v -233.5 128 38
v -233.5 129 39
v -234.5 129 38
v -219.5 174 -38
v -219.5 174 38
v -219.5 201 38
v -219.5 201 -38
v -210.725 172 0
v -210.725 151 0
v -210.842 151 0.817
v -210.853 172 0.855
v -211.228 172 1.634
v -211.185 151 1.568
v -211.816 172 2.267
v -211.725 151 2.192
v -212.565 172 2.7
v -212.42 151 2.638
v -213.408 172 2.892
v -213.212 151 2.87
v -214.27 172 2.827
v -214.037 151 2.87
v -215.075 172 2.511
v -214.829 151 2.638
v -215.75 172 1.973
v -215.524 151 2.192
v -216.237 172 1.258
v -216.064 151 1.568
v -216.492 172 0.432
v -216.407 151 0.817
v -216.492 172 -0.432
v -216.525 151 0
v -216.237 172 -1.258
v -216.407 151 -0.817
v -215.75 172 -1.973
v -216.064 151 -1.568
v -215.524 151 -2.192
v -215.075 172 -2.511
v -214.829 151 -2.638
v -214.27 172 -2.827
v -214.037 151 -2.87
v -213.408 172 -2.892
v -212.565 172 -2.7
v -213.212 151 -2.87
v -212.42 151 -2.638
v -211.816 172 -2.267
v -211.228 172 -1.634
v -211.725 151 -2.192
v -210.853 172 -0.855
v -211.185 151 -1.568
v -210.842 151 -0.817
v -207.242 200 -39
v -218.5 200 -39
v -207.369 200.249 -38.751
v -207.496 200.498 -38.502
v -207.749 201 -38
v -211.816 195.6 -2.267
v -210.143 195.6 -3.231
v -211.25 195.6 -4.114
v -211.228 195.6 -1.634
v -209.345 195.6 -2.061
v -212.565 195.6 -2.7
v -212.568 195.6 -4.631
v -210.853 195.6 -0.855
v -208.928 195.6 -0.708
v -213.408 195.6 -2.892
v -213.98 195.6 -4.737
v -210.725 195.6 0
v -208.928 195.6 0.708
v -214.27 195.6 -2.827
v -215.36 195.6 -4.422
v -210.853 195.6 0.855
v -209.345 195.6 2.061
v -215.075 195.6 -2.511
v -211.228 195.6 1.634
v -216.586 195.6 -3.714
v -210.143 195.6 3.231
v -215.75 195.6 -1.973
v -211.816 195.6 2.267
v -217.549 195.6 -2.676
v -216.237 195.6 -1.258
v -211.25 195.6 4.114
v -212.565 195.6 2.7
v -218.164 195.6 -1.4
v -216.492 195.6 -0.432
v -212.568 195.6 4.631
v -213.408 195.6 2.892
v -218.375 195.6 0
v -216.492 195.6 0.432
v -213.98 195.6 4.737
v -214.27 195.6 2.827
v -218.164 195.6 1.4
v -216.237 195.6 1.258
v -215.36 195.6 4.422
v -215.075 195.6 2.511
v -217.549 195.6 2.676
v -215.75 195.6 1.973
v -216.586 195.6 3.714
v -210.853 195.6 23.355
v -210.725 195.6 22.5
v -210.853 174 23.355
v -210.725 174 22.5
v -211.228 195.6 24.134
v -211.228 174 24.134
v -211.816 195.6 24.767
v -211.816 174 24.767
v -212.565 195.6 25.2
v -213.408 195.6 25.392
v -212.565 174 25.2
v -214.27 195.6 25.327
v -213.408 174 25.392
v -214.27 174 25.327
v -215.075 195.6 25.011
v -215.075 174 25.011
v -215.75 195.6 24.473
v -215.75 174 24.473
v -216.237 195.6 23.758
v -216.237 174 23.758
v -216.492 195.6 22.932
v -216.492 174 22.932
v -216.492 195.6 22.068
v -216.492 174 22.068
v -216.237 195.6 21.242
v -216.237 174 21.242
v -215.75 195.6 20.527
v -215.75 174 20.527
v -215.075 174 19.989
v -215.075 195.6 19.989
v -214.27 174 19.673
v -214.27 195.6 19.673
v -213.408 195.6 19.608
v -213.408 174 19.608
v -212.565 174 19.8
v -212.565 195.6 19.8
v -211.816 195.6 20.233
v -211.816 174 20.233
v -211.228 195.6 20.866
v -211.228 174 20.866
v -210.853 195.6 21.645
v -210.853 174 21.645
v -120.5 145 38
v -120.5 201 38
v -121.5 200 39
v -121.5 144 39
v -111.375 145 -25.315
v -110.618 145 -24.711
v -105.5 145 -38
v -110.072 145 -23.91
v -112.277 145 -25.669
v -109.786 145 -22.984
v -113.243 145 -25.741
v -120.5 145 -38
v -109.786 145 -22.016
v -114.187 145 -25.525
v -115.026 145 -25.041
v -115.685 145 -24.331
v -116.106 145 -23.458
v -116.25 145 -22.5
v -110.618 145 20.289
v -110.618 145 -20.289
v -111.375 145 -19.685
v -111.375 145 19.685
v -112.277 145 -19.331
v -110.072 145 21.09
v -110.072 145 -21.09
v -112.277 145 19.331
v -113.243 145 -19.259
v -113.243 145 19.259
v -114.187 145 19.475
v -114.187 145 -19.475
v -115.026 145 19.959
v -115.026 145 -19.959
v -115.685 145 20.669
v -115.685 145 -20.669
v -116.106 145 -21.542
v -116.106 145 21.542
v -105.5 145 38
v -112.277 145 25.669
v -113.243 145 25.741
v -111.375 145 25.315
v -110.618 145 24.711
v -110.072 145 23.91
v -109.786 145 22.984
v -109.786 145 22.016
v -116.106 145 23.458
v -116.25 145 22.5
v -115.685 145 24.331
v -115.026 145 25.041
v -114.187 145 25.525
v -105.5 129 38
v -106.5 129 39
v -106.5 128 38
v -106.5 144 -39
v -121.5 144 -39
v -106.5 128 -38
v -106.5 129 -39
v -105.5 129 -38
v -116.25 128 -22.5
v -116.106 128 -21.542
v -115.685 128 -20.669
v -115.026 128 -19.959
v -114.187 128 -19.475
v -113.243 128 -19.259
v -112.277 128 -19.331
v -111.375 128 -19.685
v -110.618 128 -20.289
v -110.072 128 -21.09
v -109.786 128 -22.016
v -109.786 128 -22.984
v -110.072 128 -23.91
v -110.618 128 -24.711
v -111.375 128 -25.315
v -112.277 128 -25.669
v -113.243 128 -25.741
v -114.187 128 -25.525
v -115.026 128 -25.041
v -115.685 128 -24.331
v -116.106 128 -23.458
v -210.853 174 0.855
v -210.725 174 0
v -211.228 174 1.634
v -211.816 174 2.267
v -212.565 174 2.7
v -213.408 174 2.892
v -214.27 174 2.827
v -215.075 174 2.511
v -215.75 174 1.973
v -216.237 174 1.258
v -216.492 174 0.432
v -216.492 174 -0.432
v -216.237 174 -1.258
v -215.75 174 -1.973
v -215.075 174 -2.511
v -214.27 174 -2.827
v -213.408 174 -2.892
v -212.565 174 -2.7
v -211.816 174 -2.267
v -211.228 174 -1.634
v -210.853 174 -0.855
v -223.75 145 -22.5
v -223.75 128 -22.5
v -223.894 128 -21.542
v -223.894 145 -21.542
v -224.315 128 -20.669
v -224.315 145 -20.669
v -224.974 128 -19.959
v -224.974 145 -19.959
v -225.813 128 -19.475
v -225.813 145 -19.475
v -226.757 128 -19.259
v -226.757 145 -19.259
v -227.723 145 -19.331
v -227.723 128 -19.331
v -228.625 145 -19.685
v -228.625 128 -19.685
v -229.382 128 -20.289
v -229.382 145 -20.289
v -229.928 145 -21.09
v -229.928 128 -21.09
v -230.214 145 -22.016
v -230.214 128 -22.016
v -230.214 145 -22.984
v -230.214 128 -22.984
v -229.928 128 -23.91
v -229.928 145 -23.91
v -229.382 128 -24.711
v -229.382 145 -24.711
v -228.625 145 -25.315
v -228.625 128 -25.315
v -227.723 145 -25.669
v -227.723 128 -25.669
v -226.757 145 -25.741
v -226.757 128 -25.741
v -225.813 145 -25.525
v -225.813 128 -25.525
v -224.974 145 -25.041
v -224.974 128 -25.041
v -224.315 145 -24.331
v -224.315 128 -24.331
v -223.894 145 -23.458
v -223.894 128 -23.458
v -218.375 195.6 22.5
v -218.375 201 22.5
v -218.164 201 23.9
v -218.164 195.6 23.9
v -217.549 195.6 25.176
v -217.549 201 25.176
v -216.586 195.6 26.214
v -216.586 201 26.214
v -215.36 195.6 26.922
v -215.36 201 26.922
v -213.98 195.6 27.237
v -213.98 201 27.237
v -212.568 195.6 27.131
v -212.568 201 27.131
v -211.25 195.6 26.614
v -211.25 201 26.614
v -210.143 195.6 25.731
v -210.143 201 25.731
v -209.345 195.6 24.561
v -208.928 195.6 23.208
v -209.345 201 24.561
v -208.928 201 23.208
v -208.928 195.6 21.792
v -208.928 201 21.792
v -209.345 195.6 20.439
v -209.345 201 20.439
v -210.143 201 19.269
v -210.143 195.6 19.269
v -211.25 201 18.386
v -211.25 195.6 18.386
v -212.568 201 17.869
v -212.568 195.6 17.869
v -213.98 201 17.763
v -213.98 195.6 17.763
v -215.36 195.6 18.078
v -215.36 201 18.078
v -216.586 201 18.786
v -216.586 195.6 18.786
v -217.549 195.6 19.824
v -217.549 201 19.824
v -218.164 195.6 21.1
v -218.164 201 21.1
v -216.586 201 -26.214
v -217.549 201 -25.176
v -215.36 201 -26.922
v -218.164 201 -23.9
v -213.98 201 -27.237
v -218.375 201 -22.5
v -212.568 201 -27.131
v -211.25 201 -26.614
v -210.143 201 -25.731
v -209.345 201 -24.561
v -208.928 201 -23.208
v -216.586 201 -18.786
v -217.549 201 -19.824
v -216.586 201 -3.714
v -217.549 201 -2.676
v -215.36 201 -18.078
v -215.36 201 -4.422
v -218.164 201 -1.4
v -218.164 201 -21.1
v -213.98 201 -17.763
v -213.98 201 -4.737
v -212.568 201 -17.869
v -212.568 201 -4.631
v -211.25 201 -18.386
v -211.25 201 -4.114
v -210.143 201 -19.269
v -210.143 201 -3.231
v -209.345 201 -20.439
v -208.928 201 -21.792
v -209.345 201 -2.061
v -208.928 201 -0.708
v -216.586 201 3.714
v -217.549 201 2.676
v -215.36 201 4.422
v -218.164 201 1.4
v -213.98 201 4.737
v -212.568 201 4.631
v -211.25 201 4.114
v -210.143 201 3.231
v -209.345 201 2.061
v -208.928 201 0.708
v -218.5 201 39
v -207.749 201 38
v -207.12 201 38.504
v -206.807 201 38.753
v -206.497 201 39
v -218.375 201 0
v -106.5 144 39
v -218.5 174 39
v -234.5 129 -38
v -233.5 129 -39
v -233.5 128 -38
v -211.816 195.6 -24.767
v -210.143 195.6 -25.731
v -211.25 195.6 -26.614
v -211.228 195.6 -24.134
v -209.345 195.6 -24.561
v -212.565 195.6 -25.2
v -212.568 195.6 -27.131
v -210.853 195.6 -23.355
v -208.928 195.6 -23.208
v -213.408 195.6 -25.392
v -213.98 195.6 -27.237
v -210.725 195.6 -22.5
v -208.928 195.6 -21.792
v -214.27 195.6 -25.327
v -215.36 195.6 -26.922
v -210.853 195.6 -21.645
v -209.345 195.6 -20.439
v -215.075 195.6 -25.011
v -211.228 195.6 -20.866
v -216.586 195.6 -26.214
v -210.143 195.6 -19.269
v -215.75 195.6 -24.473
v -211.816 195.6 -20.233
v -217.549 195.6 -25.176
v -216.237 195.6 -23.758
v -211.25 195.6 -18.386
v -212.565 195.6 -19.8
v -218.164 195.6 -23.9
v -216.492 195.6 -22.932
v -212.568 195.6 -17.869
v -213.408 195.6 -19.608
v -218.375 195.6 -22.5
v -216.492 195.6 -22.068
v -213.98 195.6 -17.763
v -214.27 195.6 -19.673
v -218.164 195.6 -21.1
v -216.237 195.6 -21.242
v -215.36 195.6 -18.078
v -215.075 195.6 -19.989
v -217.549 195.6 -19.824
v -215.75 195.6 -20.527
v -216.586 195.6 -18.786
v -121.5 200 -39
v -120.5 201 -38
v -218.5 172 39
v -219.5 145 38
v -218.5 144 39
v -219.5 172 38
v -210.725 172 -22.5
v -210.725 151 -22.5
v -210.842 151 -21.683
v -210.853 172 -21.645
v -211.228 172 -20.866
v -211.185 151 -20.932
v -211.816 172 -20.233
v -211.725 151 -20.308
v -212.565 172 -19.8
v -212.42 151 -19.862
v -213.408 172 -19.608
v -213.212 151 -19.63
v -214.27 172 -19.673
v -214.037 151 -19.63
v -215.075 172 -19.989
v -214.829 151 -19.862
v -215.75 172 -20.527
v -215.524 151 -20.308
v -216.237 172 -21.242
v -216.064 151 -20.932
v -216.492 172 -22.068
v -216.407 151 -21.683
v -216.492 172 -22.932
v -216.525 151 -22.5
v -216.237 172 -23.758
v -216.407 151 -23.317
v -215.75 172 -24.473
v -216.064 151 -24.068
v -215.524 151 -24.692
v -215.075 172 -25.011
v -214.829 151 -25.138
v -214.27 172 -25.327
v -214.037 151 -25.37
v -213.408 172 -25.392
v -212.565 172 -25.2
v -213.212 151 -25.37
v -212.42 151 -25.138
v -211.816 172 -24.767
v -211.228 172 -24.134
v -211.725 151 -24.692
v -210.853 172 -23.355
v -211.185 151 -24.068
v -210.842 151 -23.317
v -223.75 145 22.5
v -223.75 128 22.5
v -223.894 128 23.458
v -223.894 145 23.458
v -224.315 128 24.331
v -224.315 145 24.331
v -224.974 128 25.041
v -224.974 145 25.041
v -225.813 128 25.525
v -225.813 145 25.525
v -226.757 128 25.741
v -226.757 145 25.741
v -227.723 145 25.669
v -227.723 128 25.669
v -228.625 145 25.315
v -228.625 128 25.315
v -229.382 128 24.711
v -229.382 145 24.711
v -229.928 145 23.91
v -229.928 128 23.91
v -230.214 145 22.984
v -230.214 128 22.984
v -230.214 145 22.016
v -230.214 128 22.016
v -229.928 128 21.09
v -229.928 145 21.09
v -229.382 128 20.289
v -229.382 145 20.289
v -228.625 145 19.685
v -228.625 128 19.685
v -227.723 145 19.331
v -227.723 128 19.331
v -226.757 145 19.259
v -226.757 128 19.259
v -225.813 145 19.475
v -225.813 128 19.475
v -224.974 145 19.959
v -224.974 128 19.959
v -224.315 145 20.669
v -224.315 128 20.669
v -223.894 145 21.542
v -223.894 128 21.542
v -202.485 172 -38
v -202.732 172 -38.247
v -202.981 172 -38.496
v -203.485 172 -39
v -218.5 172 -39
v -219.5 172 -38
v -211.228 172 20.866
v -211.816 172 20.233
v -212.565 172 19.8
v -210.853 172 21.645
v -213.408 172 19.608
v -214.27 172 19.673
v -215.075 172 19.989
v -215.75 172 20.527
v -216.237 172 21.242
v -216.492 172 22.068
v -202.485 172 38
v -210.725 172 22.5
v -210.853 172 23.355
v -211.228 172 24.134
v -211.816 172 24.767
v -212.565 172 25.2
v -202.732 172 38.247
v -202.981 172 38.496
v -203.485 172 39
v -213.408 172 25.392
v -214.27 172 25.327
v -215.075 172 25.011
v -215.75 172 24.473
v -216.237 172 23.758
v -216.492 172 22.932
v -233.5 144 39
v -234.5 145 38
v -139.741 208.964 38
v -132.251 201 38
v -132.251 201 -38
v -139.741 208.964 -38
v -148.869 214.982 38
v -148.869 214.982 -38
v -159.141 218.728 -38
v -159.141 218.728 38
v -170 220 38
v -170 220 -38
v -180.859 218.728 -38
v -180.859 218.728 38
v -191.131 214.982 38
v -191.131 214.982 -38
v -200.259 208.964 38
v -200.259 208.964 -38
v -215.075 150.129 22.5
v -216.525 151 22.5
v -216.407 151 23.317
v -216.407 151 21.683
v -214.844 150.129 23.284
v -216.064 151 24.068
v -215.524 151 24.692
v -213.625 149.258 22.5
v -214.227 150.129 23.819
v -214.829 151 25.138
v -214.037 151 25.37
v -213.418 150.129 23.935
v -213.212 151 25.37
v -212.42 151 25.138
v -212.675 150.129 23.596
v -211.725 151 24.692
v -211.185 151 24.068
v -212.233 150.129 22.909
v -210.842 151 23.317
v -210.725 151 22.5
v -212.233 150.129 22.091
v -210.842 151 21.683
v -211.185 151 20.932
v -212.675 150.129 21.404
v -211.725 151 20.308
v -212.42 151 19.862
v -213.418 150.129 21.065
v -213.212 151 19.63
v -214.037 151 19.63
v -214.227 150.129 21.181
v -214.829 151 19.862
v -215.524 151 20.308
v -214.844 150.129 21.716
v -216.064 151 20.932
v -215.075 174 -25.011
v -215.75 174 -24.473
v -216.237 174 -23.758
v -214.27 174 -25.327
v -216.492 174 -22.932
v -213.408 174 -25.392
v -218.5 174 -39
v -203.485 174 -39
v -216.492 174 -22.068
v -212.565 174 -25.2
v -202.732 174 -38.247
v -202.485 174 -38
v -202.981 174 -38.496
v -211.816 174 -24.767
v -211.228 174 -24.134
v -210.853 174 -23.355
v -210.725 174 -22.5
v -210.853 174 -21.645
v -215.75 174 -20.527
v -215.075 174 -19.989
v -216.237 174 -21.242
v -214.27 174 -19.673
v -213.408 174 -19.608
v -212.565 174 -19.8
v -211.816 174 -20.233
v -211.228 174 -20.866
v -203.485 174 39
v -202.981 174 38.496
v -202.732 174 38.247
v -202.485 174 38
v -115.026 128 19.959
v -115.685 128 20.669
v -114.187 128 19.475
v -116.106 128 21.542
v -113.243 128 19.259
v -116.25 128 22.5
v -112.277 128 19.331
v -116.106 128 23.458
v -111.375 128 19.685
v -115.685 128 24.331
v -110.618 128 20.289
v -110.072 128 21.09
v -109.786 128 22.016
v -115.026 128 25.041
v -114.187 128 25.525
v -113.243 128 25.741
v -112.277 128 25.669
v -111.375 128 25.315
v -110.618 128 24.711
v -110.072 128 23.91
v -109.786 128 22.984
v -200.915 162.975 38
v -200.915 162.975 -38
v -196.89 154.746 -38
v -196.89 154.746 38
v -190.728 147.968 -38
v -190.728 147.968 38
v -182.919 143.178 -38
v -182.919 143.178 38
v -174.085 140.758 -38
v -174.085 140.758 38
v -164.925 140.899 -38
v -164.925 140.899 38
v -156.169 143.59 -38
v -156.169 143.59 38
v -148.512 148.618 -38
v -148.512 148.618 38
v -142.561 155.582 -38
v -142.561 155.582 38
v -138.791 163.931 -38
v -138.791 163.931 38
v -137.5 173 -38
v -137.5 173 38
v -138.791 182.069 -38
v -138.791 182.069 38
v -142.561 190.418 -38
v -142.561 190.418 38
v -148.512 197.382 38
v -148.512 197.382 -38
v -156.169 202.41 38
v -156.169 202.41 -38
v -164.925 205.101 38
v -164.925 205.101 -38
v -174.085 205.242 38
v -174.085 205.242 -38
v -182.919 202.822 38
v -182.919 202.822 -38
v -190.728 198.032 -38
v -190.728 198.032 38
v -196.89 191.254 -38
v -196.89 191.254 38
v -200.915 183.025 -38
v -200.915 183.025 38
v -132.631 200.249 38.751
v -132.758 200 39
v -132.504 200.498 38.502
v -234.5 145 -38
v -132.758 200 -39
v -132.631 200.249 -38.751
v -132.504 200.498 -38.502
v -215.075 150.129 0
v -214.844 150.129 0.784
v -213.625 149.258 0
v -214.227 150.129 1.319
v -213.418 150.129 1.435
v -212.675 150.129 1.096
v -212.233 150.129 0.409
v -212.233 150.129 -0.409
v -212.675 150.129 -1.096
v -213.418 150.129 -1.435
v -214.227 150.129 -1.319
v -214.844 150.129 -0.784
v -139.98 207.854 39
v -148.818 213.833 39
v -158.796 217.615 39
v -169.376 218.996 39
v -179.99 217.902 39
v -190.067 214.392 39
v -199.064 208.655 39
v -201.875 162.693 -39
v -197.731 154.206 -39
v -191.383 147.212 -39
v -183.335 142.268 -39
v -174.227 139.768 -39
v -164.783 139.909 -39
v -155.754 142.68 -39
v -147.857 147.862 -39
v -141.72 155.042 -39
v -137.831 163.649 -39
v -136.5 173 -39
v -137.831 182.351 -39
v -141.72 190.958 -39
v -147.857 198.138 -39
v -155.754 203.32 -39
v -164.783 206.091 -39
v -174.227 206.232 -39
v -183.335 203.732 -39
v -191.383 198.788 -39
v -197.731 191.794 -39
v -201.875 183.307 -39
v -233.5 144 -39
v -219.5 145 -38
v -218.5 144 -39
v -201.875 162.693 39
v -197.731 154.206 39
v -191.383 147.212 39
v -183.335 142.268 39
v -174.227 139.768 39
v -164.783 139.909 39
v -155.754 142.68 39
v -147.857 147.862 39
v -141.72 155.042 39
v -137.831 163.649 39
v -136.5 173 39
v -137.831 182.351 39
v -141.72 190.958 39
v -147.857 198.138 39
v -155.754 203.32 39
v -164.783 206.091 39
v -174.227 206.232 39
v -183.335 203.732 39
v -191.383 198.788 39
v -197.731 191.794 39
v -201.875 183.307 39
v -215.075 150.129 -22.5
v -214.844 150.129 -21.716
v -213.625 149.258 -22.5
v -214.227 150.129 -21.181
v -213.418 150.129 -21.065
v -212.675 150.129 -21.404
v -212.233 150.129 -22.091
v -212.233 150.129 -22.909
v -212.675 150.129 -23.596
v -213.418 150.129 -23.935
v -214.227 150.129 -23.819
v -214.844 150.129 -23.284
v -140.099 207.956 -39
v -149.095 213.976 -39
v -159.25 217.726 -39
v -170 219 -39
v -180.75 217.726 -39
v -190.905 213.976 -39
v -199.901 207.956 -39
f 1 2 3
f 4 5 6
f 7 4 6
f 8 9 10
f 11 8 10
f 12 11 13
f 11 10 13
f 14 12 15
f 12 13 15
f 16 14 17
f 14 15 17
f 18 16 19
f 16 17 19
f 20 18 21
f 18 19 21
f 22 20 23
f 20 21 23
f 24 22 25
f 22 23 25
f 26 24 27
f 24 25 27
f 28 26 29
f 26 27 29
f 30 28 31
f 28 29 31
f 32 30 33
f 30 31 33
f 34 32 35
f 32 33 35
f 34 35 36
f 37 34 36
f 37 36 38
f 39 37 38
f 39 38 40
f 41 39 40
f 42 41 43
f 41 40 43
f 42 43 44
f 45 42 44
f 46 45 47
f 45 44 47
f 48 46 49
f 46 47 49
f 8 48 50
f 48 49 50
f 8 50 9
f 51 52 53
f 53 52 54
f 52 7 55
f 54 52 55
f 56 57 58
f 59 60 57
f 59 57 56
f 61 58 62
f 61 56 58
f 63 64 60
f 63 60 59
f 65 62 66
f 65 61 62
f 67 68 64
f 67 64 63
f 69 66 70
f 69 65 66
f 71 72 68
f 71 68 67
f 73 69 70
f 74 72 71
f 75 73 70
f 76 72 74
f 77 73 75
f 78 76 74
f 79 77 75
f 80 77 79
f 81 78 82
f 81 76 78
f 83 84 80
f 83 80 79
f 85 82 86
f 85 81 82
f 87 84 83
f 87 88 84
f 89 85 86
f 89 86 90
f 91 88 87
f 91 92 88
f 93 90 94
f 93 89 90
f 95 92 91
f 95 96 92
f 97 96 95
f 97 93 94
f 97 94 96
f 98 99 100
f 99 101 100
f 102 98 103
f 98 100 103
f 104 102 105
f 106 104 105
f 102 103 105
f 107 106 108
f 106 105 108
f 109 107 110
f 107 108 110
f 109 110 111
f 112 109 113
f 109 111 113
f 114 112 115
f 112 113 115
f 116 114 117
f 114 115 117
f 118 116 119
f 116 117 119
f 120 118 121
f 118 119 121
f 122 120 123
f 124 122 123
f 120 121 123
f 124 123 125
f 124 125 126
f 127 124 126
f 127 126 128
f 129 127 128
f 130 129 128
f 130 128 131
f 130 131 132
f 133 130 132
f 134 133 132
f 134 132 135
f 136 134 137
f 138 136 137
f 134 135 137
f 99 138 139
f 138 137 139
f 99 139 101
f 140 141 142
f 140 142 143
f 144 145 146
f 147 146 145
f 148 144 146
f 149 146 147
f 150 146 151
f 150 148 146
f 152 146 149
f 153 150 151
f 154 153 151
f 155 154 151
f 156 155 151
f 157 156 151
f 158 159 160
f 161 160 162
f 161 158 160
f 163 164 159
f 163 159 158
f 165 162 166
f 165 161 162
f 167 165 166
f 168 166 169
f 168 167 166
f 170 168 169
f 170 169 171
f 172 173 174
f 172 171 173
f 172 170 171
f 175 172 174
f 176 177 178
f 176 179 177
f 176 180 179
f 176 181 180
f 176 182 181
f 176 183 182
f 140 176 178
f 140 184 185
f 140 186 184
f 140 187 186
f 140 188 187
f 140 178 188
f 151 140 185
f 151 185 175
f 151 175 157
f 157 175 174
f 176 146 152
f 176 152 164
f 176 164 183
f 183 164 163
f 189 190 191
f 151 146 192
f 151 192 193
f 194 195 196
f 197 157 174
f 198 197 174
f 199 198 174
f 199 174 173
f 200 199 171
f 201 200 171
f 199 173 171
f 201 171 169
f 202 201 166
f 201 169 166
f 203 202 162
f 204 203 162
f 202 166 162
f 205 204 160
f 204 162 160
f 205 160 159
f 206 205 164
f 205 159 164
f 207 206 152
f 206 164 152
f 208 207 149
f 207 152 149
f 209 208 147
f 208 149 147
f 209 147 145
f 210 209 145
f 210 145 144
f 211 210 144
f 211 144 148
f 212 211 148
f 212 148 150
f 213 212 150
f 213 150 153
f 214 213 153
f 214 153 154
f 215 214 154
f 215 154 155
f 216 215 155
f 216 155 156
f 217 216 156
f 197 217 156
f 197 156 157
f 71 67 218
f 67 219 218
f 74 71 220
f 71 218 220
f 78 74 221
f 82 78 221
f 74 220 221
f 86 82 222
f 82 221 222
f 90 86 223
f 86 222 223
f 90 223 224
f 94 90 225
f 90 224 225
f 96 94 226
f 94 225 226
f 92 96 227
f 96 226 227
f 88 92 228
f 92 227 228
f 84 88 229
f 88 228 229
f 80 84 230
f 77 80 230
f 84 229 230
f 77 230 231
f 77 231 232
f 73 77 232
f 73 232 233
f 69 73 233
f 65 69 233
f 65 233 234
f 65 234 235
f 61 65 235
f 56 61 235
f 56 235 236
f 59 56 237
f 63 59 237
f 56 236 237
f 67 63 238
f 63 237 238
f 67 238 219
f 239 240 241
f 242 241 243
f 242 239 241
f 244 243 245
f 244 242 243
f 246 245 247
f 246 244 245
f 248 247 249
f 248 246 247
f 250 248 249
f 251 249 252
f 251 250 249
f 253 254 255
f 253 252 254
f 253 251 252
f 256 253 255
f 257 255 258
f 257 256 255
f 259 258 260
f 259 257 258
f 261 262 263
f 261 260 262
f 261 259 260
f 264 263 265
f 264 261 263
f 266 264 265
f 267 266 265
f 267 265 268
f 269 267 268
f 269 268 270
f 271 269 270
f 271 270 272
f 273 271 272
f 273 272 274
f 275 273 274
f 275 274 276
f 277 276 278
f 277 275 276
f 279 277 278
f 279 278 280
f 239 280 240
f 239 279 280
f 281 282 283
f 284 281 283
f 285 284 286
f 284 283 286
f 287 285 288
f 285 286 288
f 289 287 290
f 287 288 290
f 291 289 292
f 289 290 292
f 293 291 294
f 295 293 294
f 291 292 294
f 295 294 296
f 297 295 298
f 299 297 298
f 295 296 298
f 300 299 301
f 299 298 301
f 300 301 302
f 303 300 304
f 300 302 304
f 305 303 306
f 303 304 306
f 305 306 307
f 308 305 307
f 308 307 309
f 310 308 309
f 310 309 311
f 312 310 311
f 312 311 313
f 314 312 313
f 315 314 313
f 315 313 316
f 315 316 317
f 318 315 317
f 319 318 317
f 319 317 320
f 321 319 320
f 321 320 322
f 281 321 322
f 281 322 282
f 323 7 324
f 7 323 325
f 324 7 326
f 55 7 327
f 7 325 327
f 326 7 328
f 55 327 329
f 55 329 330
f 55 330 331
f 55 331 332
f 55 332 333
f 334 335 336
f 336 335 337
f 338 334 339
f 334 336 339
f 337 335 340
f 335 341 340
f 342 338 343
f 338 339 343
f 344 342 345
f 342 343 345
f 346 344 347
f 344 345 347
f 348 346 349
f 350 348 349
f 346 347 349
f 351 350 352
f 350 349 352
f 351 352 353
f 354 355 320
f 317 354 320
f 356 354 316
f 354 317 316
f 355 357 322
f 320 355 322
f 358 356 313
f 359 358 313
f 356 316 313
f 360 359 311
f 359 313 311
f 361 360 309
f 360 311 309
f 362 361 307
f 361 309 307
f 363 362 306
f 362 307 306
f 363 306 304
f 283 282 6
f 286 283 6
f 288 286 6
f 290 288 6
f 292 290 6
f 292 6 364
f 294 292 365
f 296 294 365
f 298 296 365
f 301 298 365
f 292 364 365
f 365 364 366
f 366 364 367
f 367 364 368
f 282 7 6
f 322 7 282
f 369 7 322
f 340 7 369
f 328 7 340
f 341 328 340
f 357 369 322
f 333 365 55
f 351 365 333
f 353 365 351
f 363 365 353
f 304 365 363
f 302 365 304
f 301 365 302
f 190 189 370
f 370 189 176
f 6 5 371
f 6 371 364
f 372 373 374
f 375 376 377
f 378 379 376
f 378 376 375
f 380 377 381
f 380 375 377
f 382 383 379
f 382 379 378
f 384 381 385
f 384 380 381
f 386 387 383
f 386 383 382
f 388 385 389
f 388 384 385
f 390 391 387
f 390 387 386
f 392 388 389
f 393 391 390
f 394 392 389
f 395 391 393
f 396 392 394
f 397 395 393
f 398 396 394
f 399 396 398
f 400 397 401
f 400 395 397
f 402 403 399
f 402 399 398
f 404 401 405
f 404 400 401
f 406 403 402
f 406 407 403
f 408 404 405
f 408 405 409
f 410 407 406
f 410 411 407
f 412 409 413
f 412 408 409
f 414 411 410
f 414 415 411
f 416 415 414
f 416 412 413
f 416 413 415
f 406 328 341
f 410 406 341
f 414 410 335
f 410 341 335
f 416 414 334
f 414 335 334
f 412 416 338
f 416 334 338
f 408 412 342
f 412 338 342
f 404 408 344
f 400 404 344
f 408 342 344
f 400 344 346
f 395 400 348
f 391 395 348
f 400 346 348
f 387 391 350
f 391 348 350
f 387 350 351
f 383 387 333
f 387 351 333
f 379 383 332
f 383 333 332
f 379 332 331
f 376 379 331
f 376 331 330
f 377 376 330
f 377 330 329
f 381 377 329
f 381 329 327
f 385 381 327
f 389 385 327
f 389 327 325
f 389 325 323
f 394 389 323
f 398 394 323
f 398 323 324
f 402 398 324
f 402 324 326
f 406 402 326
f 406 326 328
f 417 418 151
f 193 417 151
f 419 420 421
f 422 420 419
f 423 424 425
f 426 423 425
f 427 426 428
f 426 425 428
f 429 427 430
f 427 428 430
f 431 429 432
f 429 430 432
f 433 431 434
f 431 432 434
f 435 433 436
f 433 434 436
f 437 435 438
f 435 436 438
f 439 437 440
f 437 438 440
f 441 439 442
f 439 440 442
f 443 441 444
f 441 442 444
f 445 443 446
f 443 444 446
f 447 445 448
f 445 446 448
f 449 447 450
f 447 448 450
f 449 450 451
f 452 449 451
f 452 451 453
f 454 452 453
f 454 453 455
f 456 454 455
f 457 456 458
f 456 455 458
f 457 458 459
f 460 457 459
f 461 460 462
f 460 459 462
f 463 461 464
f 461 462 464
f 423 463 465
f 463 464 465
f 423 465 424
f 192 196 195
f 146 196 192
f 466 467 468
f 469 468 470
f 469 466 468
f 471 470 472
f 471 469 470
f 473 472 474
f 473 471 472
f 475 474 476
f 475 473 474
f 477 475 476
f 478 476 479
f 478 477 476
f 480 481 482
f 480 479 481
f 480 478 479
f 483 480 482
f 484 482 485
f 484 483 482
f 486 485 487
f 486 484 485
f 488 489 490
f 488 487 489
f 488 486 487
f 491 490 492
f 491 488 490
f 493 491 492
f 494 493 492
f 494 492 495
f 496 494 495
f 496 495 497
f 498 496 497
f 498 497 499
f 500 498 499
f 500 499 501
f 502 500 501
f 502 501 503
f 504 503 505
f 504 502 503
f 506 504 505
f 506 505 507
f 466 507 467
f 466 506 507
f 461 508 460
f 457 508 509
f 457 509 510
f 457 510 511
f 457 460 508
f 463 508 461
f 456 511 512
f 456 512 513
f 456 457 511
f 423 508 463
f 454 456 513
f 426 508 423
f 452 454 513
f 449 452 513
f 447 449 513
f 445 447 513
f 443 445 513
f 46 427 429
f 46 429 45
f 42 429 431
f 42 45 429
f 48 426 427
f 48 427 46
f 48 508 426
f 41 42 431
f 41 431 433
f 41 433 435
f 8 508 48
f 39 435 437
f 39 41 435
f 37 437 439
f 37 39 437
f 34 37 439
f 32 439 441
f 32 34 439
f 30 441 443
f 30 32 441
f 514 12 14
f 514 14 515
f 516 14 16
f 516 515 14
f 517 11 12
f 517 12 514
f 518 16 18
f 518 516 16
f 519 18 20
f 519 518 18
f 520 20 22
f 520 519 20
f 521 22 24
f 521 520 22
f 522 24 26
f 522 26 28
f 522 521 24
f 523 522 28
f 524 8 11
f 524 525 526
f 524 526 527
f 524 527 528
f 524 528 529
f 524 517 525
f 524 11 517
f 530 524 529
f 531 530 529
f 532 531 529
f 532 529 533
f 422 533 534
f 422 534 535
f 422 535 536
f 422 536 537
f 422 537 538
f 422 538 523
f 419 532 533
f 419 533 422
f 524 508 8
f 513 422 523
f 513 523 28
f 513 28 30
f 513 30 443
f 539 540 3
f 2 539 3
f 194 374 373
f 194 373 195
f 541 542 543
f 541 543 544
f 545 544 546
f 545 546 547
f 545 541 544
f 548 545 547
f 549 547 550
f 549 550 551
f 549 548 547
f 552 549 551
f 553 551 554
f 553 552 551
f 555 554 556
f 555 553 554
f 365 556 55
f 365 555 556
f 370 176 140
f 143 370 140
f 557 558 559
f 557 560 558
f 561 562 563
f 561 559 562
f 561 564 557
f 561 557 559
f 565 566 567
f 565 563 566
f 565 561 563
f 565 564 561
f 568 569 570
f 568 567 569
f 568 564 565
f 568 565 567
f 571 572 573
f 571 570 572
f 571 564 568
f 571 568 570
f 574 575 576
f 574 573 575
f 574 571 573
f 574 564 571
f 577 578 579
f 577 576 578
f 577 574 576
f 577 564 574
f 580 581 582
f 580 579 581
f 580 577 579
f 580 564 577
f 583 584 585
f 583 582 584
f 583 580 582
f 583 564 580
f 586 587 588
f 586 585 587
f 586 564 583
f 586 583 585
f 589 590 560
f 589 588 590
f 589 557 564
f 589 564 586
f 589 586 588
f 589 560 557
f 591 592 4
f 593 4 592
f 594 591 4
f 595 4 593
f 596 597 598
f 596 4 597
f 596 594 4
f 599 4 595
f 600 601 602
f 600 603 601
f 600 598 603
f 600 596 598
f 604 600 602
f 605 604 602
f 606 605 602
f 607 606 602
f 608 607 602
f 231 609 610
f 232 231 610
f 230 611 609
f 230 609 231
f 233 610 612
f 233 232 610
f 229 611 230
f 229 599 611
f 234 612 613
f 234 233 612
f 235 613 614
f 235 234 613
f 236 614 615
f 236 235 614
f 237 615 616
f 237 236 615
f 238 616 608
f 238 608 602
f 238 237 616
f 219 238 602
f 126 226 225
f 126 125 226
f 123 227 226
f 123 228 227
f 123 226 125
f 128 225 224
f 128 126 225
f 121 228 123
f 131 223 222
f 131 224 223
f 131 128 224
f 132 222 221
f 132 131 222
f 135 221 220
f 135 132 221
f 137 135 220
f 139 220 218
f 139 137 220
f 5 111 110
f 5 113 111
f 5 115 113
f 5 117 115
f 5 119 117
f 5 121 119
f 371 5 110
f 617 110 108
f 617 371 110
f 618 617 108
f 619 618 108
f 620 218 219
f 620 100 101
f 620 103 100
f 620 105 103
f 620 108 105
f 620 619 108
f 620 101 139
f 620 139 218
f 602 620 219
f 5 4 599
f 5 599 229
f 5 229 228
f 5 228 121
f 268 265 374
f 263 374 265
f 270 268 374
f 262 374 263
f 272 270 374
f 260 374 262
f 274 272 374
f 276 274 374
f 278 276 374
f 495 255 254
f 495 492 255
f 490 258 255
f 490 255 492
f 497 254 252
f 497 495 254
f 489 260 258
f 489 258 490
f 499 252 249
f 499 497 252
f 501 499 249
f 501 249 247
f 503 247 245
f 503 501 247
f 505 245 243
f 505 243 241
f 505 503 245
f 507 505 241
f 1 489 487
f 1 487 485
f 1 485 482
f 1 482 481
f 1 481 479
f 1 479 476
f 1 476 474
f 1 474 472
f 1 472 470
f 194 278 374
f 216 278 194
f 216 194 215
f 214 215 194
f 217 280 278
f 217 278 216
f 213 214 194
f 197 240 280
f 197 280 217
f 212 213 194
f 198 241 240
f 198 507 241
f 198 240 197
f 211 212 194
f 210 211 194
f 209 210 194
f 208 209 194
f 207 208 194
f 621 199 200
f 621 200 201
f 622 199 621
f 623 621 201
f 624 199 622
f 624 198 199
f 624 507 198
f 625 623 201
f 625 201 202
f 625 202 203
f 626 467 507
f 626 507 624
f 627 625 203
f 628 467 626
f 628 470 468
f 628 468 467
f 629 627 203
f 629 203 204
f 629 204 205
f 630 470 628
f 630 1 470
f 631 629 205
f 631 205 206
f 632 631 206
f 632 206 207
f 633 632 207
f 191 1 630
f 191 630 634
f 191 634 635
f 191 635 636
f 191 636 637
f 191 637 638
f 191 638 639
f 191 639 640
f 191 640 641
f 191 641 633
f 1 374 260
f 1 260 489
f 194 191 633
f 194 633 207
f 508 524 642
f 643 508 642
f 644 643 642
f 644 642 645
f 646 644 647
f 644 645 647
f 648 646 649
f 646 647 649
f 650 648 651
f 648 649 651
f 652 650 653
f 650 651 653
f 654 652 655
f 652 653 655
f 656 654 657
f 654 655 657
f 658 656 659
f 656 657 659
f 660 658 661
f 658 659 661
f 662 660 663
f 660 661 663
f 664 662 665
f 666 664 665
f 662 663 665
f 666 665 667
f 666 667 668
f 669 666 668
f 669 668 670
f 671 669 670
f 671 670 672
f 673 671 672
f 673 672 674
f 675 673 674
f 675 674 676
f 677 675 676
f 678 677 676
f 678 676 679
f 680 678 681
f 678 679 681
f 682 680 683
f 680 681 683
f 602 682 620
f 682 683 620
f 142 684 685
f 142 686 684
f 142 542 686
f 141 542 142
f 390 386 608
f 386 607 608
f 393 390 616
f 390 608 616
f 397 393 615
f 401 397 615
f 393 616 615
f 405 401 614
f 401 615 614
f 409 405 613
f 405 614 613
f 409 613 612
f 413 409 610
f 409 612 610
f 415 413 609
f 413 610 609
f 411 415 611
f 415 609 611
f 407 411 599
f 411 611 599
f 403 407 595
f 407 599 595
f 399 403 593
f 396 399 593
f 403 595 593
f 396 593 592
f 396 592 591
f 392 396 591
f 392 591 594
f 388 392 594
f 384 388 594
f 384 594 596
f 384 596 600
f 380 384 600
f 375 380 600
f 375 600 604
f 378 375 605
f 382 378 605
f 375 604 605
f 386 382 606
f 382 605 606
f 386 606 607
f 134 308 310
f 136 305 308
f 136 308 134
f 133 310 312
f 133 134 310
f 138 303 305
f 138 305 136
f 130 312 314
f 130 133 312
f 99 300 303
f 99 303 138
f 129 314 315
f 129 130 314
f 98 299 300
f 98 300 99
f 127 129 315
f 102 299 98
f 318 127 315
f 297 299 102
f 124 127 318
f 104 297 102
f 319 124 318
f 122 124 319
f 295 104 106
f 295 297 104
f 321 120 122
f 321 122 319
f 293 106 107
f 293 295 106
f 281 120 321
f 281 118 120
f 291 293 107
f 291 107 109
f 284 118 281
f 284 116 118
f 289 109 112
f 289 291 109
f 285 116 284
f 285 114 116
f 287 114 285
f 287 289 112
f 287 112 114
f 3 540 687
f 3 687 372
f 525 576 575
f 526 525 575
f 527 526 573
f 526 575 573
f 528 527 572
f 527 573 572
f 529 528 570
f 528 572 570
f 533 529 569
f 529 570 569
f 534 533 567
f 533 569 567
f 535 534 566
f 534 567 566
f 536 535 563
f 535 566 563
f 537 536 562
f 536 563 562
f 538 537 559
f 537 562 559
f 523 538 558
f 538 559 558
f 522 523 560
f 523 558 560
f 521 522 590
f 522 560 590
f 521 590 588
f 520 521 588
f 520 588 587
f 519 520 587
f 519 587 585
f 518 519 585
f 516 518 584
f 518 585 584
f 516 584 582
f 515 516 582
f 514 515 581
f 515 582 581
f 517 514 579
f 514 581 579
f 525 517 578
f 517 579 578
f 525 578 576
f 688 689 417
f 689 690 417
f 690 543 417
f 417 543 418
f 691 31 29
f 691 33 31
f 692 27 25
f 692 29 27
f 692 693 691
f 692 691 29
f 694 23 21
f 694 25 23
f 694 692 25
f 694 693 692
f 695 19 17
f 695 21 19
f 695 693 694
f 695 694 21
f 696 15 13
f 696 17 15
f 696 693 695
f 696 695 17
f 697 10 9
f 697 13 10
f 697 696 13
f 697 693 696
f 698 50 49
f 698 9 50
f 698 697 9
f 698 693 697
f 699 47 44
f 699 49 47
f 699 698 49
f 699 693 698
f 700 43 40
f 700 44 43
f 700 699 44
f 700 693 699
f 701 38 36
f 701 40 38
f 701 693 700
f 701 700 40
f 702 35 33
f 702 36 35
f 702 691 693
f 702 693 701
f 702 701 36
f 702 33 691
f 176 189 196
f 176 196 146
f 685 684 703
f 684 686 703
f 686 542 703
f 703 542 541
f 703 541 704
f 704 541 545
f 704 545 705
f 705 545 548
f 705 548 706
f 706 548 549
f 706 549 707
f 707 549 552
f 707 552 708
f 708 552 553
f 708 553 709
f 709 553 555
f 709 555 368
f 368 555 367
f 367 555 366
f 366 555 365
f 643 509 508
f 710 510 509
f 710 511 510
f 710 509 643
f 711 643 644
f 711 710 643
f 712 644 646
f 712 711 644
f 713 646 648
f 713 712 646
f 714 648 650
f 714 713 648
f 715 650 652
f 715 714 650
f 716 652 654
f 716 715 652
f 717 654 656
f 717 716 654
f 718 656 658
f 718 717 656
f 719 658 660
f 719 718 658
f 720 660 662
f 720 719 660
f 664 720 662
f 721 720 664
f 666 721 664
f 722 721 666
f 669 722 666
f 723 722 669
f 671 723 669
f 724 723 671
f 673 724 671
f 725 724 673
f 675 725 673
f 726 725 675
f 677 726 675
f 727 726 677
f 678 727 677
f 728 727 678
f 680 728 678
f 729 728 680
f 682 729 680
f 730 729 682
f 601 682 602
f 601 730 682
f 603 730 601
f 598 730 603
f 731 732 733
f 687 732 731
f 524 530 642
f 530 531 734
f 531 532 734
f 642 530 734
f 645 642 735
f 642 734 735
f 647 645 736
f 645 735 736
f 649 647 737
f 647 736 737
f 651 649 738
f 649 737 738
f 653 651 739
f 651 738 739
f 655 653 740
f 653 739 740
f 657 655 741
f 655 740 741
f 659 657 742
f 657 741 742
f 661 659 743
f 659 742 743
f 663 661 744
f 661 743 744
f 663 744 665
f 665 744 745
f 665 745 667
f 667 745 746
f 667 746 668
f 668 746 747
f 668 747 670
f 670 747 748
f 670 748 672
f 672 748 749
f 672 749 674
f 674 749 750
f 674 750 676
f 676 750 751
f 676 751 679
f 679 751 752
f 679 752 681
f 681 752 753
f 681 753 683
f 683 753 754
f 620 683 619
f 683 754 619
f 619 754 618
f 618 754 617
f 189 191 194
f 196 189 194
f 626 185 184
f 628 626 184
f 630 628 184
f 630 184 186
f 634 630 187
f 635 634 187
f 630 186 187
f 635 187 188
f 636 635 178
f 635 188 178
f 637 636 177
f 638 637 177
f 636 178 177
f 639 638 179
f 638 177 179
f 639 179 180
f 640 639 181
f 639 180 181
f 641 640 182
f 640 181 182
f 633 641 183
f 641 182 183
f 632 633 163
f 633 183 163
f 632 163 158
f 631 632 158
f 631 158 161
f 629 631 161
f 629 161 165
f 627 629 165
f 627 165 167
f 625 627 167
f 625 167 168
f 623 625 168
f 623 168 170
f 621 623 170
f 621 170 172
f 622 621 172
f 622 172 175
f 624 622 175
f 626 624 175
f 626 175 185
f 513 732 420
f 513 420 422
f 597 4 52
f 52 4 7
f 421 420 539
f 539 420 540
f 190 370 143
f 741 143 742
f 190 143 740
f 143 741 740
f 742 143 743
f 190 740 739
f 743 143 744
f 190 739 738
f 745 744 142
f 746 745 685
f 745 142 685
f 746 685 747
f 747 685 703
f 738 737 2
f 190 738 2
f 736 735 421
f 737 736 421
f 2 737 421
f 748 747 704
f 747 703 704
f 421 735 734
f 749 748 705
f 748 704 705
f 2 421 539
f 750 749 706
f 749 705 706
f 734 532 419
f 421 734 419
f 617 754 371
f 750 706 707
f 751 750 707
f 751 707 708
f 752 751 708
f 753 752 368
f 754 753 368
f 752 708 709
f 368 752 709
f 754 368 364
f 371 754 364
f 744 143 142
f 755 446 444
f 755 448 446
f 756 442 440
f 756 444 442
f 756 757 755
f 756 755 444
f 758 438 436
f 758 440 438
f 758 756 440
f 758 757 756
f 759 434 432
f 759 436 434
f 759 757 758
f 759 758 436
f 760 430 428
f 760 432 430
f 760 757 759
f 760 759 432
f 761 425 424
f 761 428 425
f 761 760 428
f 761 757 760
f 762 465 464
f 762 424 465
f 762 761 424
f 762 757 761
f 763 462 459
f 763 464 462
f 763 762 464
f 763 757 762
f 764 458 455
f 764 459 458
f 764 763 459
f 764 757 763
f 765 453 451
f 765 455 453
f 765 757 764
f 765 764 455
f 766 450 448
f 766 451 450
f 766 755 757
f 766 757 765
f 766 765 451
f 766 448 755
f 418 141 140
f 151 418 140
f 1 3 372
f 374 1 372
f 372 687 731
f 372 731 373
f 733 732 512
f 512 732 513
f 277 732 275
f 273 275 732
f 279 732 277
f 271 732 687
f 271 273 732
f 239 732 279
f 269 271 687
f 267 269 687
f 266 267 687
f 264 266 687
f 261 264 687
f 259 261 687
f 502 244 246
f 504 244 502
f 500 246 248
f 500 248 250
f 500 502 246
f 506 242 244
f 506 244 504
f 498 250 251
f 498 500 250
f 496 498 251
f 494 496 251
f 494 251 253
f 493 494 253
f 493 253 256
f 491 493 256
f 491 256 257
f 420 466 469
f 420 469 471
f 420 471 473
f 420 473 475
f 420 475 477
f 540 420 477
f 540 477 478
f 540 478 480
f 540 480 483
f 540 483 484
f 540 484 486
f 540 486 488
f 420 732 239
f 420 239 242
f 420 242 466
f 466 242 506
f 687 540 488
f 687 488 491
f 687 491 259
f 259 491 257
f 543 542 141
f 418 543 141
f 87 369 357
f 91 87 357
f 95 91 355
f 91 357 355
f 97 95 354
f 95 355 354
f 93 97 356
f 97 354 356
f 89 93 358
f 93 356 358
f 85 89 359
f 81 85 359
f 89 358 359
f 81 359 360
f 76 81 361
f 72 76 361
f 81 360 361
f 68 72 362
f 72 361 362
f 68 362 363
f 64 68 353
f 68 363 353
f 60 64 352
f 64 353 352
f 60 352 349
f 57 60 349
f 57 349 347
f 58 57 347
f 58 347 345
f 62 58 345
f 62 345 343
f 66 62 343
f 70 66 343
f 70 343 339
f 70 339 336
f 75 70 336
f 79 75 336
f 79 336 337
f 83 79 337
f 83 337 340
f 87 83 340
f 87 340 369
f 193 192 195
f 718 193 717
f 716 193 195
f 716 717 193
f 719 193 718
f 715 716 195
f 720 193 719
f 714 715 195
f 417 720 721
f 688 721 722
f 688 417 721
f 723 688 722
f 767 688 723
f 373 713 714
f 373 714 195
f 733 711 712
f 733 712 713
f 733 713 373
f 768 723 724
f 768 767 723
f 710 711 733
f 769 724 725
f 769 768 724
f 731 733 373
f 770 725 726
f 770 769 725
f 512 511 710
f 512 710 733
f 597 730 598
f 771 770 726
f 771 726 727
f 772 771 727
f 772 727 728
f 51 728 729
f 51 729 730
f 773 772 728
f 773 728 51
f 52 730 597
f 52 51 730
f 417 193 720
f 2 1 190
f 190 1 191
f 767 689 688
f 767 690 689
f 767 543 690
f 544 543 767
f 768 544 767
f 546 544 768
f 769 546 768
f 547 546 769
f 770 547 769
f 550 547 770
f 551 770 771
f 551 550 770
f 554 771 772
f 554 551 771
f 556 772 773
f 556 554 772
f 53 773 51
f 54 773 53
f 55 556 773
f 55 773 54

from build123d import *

# Parameters (mm, degrees)
PAD012_DEPTH            = 39
HOLE003_D               = 5.8
HOLE003_DEPTH           = 50
HOLE003_CBORE_D         = 9.5
HOLE003_CBORE_DEPTH     = 5.4
HOLE003_TIPS_R          = 2.9
CHAMFER002_SIZE         = 1
SKETCH018_R             = 3.25
POCKET002_DEPTH         = 370.209154
BODY004_PLACEMENT_ANGLE = 270


with BuildPart() as part:
    # Sketch016 → Pad012 (new body, symmetric)
    with BuildSketch(Plane.XZ):
        with BuildLine():
            ThreePointArc((-32.484612, -1), (32.5, 0), (-32.484612, 1))
            Line((-49.5, 1), (-32.484612, 1))
            Line((-49.5, 1), (-49.5, 28))
            Line((-49.5, 28), (-37.749172, 28))
            ThreePointArc((37.749172, 28), (0, 47), (-37.749172, 28))
            Line((37.749172, 28), (49.5, 28))
            Line((49.5, 28), (49.5, -28))
            Line((64.5, -28), (49.5, -28))
            Line((64.5, -45), (64.5, -28))
            Line((-64.5, -45), (64.5, -45))
            Line((-64.5, -28), (-64.5, -45))
            Line((-49.5, -28), (-64.5, -28))
            Line((-49.5, -28), (-49.5, -1))
            Line((-32.484612, -1), (-49.5, -1))
        make_face()
    extrude(amount=PAD012_DEPTH, both=True)

    # Hole003
    with Locations(Plane(origin=(0, 0, 28), x_dir=(-1, 0, 0), z_dir=(0, 0, 1))):
        with Locations((43.624586, 0), (43.624586, 22.5), (43.624586, -22.5)):
            CounterBoreHole(HOLE003_D / 2, HOLE003_CBORE_D / 2, HOLE003_CBORE_DEPTH, depth=HOLE003_DEPTH)

    # Hole003 tips → Hole003 tip 1 section 0
    with BuildSketch(Plane(origin=(0, 0, -22), x_dir=(-1, 0, 0), z_dir=(0, 0, 1)), mode=Mode.PRIVATE) as hole003_tip_1_s0:
        with Locations((43.624586, 0)):
            Circle(HOLE003_TIPS_R)
    loft([hole003_tip_1_s0.sketch, Vertex(-43.624586, 0, -23.742496)], mode=Mode.SUBTRACT)

    # Hole003 tips → Hole003 tip 2 section 0
    with BuildSketch(Plane(origin=(0, 0, -22), x_dir=(-1, 0, 0), z_dir=(0, 0, 1)), mode=Mode.PRIVATE) as hole003_tip_2_s0:
        with Locations((43.624586, 22.5)):
            Circle(HOLE003_TIPS_R)
    loft([hole003_tip_2_s0.sketch, Vertex(-43.624586, -22.5, -23.742496)], mode=Mode.SUBTRACT)

    # Hole003 tips → Hole003 tip 3 section 0
    with BuildSketch(Plane(origin=(0, 0, -22), x_dir=(-1, 0, 0), z_dir=(0, 0, 1)), mode=Mode.PRIVATE) as hole003_tip_3_s0:
        with Locations((43.624586, -22.5)):
            Circle(HOLE003_TIPS_R)
    loft([hole003_tip_3_s0.sketch, Vertex(-43.624586, 22.5, -23.742496)], mode=Mode.SUBTRACT)

    # Chamfer002
    chamfer002_edges = [part.edges().sort_by_distance(p)[0] for p in [
        (32.5, 39, 0),
        (32.5, -39, 0),
        (0, -39, 47),
        (43.624586, -39, 28),
        (49.5, -39, 0),
        (57, -39, -28),
        (64.5, -39, -36.5),
        (-64.5, -39, -36.5),
        (-57, -39, -28),
        (-49.5, -39, -14.5),
        (-49.5, -39, 14.5),
        (0, -39, -45),
        (0, 39, 47),
        (-43.624586, 39, 28),
        (-49.5, 39, 14.5),
        (-49.5, 39, -14.5),
        (-57, 39, -28),
        (-64.5, 39, -36.5),
        (0, 39, -45),
        (64.5, 39, -36.5),
        (57, 39, -28),
        (49.5, 39, 0),
        (43.624586, 39, 28),
        (-64.5, 0, -45),
        (64.5, 0, -45),
    ]]
    chamfer(chamfer002_edges, length=CHAMFER002_SIZE)

    # Sketch018 (on Face51 of Chamfer002) → Pocket002 (cut, through all)
    with BuildSketch(Plane(origin=(0, 0, -28), x_dir=(-1, 0, 0), z_dir=(0, 0, 1))):
        with Locations((-57, 22.5)):
            Circle(SKETCH018_R)
        with Locations((-57, -22.5)):
            Circle(SKETCH018_R)
    pocket002 = extrude(amount=-POCKET002_DEPTH, mode=Mode.SUBTRACT)

    # Mirrored001: Pocket002 across YZ
    add(pocket002.mirror(Plane.YZ), mode=Mode.SUBTRACT)


with BuildPart() as part_1:
    # Body004 placement: moved
    add(part.part.moved(Location((-170, 173, 0))).rotate(Axis((-170, 173, 0), (1, 0, 0)), BODY004_PLACEMENT_ANGLE))


solid = part_1.part
